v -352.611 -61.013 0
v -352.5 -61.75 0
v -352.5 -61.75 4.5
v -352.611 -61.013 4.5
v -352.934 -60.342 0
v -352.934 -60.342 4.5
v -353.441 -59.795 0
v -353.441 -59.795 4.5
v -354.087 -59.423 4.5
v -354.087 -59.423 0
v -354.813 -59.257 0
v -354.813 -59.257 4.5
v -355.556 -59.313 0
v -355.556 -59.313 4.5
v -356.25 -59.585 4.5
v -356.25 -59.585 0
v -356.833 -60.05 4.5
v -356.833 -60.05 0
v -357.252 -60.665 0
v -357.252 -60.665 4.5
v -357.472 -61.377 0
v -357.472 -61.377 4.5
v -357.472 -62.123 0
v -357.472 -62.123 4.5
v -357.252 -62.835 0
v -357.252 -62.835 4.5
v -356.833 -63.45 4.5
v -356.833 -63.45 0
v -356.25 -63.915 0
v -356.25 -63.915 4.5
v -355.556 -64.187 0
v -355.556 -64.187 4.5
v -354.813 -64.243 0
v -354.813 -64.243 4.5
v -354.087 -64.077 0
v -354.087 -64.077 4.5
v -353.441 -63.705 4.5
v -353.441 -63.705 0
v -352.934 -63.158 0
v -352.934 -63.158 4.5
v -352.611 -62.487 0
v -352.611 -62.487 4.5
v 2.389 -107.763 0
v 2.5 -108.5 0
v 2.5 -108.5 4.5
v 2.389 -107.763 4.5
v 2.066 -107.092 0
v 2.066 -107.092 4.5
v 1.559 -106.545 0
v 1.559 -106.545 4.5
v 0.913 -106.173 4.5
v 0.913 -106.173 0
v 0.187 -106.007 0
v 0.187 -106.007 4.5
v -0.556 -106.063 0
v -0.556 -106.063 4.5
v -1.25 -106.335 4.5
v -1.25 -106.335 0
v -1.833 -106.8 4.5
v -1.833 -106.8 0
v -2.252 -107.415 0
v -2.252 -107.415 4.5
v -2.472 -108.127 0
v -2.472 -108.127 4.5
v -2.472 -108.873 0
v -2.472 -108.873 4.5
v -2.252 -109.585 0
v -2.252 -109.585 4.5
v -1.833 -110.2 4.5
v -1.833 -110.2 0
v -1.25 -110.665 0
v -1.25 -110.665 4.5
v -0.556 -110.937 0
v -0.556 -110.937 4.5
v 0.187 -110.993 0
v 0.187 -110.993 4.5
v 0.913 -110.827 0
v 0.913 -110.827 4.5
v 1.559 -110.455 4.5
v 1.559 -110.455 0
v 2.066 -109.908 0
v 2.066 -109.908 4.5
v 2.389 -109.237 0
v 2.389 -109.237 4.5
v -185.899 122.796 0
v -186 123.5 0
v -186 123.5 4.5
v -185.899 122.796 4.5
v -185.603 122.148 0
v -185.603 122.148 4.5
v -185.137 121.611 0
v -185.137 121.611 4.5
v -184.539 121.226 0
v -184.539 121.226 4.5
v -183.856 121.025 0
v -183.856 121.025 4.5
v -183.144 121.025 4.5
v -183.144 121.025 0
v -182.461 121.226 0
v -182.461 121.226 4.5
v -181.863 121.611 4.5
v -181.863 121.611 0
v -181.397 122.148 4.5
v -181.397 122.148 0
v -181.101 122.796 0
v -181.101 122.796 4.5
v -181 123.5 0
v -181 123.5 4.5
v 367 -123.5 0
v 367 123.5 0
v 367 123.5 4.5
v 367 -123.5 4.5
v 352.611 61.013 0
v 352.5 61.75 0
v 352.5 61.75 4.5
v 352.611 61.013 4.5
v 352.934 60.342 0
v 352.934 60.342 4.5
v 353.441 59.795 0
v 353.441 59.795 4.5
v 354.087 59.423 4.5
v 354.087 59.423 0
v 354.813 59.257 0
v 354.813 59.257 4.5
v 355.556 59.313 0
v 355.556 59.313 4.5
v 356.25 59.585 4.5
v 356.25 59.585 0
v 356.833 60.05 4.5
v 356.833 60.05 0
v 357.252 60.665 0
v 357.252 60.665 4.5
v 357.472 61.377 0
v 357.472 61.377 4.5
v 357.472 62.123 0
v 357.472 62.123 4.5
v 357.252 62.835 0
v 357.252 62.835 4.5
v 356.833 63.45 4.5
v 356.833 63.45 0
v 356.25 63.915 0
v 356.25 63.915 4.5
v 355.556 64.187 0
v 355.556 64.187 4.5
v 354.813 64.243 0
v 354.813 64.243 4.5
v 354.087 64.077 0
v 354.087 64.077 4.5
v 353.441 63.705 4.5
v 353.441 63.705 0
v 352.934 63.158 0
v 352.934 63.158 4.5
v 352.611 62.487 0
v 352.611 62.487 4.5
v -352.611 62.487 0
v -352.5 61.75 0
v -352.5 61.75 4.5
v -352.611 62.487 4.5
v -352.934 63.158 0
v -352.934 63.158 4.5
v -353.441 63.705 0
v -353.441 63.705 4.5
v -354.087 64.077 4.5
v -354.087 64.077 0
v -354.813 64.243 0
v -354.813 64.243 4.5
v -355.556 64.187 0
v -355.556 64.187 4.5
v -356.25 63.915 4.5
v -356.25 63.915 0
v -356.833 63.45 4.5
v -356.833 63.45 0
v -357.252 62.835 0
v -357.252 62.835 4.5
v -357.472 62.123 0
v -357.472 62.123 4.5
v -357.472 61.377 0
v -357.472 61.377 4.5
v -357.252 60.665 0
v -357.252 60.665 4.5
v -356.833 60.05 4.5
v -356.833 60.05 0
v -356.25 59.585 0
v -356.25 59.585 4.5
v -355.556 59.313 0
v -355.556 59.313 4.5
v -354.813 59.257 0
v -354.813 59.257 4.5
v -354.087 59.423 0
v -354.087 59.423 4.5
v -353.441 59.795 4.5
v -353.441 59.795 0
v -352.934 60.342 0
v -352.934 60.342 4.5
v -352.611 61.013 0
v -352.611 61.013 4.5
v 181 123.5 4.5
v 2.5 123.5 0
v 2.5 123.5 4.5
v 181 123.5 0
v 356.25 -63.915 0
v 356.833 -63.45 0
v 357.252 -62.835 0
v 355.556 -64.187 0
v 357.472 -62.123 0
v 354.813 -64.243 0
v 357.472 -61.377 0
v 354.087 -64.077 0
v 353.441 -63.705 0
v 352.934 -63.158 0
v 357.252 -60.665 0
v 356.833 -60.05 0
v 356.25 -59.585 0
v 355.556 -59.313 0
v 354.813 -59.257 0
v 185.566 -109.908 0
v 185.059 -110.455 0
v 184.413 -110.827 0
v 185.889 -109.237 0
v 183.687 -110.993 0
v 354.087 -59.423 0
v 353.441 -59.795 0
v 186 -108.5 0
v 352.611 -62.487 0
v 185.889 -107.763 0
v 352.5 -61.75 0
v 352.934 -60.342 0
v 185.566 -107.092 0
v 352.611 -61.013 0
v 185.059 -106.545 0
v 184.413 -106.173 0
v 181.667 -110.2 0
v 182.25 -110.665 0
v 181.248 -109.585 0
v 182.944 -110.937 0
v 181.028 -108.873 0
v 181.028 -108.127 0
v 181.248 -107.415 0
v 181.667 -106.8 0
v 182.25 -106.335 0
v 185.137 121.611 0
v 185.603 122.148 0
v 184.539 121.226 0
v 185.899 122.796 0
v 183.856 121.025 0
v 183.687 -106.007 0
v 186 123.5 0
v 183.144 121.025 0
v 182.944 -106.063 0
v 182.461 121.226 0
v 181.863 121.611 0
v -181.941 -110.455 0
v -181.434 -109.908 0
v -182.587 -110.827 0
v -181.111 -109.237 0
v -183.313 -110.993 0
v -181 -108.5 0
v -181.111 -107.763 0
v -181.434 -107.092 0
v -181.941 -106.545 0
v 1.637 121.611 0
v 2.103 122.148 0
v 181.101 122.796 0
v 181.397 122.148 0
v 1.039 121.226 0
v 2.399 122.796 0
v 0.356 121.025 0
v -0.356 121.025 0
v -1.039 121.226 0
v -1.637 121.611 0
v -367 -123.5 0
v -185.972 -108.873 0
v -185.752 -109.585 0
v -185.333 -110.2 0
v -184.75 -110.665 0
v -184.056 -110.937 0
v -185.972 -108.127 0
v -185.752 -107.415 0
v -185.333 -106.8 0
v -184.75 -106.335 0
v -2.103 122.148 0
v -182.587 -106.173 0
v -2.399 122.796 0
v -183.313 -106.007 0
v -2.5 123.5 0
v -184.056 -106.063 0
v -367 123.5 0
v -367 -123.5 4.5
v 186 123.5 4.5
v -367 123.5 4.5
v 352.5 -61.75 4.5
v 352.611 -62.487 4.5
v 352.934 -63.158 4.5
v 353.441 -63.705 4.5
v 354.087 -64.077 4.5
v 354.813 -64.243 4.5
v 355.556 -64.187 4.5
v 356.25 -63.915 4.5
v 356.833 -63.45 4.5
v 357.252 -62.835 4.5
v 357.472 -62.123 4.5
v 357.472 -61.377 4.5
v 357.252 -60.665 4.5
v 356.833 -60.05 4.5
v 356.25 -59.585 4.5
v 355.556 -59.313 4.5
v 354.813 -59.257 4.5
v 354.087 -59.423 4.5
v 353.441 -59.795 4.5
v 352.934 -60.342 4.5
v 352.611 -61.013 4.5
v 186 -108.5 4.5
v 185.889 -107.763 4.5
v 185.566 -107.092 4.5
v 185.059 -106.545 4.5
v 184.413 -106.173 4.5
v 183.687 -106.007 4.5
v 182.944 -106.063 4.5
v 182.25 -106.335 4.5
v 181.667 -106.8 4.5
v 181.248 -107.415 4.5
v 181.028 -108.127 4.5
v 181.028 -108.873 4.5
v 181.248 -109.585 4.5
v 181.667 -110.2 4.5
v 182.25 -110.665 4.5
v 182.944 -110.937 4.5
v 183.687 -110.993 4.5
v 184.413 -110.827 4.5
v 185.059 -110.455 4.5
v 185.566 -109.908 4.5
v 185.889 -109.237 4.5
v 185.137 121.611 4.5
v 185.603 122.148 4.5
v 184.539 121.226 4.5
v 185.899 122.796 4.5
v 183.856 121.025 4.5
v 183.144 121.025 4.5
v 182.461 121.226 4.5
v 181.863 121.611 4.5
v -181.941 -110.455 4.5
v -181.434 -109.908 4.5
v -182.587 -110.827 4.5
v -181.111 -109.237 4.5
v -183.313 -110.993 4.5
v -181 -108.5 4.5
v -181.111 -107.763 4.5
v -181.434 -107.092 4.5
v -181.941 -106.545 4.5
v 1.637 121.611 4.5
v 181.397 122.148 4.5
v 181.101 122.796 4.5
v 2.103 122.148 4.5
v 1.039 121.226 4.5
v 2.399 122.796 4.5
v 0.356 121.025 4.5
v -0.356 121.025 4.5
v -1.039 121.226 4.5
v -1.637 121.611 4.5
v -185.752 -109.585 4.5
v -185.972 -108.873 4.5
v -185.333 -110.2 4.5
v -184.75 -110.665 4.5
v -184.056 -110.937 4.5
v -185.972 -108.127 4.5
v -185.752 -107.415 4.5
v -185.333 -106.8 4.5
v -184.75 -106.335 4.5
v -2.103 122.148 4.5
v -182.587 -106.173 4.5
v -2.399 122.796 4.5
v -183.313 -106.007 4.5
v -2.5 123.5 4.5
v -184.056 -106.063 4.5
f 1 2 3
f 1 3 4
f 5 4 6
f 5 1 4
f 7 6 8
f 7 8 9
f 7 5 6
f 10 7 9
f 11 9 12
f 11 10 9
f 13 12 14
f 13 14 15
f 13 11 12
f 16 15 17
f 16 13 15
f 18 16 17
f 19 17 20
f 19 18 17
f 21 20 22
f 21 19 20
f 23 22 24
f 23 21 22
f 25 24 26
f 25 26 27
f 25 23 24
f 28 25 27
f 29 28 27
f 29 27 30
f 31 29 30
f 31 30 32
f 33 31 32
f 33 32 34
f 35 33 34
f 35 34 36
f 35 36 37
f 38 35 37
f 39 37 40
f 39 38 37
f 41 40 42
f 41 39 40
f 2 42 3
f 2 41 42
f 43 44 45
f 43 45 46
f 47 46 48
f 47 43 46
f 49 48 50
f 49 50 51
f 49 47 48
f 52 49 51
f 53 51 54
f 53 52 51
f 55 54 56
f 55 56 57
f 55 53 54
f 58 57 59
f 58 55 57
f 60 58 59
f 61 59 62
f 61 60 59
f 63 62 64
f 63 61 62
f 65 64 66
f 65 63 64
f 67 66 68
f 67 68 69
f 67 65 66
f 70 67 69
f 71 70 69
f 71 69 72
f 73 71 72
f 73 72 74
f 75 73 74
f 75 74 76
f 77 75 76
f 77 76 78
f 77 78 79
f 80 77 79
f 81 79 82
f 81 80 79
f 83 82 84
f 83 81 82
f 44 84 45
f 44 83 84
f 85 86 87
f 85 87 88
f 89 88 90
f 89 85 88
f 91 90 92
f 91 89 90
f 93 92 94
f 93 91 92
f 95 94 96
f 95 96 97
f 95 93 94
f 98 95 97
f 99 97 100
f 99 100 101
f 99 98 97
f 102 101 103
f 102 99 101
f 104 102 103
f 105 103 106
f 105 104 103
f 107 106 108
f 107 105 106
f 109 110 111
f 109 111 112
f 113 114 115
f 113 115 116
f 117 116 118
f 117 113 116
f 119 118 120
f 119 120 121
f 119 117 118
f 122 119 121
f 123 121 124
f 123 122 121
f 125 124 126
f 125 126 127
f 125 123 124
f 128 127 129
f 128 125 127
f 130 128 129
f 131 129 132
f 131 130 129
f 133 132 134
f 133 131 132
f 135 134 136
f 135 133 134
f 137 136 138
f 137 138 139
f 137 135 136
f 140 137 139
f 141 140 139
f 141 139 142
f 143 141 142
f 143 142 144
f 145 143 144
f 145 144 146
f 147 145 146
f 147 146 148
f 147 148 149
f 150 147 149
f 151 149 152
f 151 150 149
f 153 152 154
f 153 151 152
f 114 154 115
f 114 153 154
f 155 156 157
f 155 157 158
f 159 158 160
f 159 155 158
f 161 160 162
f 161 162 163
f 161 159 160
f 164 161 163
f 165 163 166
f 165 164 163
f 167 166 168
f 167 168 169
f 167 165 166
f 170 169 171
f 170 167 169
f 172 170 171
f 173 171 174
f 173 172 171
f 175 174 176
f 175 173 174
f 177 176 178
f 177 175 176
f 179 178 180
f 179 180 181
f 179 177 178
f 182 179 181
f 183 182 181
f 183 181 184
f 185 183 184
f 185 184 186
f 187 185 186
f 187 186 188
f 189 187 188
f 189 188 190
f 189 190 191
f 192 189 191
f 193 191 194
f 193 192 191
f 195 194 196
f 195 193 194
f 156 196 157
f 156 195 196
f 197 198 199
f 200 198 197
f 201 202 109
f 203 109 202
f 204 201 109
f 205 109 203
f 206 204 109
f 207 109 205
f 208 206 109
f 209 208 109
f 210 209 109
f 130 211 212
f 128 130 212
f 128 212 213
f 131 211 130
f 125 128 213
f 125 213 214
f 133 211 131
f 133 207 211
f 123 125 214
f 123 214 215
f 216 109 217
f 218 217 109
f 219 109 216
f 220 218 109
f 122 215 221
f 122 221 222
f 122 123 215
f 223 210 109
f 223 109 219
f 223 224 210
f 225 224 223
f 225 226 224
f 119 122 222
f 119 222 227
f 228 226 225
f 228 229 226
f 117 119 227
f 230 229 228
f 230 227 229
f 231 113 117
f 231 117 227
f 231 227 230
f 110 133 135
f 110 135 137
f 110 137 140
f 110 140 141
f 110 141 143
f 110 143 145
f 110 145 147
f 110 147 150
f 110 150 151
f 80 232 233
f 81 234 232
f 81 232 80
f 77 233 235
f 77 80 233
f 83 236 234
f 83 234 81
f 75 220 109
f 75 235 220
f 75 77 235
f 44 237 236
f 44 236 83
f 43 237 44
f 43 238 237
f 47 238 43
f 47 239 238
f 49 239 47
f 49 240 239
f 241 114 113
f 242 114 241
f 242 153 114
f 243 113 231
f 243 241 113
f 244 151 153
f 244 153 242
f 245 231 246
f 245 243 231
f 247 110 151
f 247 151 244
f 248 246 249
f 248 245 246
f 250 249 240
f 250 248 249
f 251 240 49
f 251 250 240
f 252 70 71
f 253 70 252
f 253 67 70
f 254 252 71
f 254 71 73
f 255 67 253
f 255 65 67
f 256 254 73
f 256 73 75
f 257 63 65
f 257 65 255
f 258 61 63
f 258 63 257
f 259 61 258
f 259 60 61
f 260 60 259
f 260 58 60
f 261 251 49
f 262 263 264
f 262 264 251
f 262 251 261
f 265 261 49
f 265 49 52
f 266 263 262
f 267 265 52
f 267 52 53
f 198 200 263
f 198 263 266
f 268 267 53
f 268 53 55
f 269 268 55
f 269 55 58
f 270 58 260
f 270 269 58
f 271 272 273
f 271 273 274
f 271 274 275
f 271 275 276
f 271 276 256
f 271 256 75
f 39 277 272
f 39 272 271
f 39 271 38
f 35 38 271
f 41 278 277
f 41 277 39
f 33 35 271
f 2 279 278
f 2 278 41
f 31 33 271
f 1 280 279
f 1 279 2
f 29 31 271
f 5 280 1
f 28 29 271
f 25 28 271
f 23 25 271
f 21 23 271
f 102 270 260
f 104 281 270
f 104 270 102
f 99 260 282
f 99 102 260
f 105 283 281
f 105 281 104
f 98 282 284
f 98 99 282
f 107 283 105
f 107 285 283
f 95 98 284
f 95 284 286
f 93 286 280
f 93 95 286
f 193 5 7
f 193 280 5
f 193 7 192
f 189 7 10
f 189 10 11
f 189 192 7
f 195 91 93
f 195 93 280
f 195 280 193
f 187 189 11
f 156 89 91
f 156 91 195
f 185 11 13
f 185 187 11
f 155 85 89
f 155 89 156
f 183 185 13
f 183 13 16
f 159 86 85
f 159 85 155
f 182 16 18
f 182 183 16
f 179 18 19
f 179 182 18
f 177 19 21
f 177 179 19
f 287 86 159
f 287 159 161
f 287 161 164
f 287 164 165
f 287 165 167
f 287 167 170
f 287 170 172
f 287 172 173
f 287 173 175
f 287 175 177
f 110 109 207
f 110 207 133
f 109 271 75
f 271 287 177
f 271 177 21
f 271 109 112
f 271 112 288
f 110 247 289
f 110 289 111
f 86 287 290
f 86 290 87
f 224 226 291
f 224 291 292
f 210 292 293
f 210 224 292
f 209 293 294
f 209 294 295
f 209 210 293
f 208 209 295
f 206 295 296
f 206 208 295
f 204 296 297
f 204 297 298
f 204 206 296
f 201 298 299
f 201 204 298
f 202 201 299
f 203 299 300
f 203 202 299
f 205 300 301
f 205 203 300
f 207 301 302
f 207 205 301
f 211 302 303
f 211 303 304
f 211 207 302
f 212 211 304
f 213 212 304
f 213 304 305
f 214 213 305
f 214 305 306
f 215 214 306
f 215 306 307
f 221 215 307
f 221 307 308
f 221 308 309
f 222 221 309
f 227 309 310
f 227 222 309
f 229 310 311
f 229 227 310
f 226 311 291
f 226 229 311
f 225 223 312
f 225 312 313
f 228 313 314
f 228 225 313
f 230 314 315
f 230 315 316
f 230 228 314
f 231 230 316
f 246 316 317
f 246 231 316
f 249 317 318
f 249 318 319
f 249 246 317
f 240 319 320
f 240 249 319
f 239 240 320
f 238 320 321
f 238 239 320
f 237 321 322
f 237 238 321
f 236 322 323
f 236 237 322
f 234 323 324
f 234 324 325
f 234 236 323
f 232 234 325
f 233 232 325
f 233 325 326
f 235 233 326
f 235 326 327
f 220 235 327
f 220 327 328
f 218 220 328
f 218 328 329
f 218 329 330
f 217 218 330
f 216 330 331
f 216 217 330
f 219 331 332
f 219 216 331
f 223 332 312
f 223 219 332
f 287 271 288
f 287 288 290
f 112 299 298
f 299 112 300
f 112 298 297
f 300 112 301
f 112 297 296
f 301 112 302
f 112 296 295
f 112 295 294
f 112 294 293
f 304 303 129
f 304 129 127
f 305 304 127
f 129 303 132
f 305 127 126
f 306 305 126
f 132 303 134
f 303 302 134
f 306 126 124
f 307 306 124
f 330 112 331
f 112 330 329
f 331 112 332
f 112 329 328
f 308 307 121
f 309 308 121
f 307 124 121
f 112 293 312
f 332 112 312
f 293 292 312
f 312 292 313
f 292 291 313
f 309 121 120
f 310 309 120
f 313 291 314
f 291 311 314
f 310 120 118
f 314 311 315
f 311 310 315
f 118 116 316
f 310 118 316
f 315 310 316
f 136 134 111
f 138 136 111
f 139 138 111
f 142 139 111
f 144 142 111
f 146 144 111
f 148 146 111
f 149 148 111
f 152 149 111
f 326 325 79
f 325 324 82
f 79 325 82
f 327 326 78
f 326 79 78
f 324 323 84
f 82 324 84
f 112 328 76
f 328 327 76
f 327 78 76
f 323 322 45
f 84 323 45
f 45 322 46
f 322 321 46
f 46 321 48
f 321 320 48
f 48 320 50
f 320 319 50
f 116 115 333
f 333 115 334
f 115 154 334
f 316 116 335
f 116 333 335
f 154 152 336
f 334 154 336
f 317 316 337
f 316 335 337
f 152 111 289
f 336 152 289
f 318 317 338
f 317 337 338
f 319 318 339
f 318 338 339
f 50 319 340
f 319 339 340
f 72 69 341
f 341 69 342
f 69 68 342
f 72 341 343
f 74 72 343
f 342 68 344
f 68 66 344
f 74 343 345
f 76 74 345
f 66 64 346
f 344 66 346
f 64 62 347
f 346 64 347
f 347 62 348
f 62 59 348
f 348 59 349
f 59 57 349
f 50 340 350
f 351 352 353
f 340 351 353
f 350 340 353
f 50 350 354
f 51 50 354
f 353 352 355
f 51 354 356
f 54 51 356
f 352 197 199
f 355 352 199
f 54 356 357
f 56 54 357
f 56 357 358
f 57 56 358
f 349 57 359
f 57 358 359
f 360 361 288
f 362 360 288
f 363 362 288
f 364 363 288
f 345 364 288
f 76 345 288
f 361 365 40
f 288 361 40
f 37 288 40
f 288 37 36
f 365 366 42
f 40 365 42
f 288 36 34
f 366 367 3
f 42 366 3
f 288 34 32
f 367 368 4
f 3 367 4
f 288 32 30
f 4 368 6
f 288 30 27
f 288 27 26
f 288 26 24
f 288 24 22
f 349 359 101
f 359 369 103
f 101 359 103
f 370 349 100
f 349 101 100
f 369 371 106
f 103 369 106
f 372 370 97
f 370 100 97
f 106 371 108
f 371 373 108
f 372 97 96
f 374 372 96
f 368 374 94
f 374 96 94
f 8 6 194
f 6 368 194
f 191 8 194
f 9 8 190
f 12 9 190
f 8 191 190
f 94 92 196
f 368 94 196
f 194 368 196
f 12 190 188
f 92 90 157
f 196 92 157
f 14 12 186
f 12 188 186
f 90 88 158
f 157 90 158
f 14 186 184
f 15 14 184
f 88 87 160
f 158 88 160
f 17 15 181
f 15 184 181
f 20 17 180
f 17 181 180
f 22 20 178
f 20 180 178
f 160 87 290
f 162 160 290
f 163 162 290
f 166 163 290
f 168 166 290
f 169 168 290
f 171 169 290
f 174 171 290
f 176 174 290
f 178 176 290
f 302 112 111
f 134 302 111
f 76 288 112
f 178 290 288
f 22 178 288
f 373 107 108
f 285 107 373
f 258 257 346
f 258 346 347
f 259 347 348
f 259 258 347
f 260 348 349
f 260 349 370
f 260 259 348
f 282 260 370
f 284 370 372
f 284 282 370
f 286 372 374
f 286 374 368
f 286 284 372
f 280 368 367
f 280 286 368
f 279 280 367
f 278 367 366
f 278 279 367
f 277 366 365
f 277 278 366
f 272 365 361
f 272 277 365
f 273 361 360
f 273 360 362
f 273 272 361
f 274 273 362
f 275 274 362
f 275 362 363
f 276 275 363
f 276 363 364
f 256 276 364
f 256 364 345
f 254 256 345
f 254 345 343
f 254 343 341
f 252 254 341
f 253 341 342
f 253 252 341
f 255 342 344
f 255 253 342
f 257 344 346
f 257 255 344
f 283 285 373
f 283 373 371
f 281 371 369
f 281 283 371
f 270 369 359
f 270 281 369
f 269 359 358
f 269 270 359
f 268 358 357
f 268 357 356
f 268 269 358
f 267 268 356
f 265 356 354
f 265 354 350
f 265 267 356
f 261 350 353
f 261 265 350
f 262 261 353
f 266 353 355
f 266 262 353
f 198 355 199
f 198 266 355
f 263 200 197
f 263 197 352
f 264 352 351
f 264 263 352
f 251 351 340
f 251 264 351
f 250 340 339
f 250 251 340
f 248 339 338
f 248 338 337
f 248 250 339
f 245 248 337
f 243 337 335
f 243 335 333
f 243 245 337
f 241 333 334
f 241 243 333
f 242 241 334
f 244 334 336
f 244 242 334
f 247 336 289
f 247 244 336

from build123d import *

# Parameters (mm, degrees)
SKETCH1_R           = 2.5
BOSS_EXTRUDE1_DEPTH = 4.5


with BuildPart() as part:
    # Sketch1 → Boss-Extrude1 (new body)
    with BuildSketch(Plane.XY):
        with BuildLine():
            Line((-367, 123.5), (-186, 123.5))
            ThreePointArc((-186, 123.5), (-183.5, 121), (-181, 123.5))
            Line((-181, 123.5), (-2.5, 123.5))
            ThreePointArc((-2.5, 123.5), (0, 121), (2.5, 123.5))
            Line((2.5, 123.5), (181, 123.5))
            ThreePointArc((181, 123.5), (183.5, 121), (186, 123.5))
            Line((186, 123.5), (367, 123.5))
            Line((367, 123.5), (367, -123.5))
            Line((367, -123.5), (-367, -123.5))
            Line((-367, -123.5), (-367, 123.5))
        make_face()
        with Locations((-355, 61.75)):
            Circle(SKETCH1_R, mode=Mode.SUBTRACT)
        with Locations((-355, -61.75)):
            Circle(SKETCH1_R, mode=Mode.SUBTRACT)
        with Locations(Location((355, -61.75, 0), (0, 0, 180))):
            Circle(SKETCH1_R, mode=Mode.SUBTRACT)
        with Locations(Location((355, 61.75, 0), (0, 0, 180))):
            Circle(SKETCH1_R, mode=Mode.SUBTRACT)
        with Locations((-183.5, -108.5)):
            Circle(SKETCH1_R, mode=Mode.SUBTRACT)
        with Locations((0, -108.5)):
            Circle(SKETCH1_R, mode=Mode.SUBTRACT)
        with Locations((183.5, -108.5)):
            Circle(SKETCH1_R, mode=Mode.SUBTRACT)
    extrude(amount=BOSS_EXTRUDE1_DEPTH)


solid = part.part
